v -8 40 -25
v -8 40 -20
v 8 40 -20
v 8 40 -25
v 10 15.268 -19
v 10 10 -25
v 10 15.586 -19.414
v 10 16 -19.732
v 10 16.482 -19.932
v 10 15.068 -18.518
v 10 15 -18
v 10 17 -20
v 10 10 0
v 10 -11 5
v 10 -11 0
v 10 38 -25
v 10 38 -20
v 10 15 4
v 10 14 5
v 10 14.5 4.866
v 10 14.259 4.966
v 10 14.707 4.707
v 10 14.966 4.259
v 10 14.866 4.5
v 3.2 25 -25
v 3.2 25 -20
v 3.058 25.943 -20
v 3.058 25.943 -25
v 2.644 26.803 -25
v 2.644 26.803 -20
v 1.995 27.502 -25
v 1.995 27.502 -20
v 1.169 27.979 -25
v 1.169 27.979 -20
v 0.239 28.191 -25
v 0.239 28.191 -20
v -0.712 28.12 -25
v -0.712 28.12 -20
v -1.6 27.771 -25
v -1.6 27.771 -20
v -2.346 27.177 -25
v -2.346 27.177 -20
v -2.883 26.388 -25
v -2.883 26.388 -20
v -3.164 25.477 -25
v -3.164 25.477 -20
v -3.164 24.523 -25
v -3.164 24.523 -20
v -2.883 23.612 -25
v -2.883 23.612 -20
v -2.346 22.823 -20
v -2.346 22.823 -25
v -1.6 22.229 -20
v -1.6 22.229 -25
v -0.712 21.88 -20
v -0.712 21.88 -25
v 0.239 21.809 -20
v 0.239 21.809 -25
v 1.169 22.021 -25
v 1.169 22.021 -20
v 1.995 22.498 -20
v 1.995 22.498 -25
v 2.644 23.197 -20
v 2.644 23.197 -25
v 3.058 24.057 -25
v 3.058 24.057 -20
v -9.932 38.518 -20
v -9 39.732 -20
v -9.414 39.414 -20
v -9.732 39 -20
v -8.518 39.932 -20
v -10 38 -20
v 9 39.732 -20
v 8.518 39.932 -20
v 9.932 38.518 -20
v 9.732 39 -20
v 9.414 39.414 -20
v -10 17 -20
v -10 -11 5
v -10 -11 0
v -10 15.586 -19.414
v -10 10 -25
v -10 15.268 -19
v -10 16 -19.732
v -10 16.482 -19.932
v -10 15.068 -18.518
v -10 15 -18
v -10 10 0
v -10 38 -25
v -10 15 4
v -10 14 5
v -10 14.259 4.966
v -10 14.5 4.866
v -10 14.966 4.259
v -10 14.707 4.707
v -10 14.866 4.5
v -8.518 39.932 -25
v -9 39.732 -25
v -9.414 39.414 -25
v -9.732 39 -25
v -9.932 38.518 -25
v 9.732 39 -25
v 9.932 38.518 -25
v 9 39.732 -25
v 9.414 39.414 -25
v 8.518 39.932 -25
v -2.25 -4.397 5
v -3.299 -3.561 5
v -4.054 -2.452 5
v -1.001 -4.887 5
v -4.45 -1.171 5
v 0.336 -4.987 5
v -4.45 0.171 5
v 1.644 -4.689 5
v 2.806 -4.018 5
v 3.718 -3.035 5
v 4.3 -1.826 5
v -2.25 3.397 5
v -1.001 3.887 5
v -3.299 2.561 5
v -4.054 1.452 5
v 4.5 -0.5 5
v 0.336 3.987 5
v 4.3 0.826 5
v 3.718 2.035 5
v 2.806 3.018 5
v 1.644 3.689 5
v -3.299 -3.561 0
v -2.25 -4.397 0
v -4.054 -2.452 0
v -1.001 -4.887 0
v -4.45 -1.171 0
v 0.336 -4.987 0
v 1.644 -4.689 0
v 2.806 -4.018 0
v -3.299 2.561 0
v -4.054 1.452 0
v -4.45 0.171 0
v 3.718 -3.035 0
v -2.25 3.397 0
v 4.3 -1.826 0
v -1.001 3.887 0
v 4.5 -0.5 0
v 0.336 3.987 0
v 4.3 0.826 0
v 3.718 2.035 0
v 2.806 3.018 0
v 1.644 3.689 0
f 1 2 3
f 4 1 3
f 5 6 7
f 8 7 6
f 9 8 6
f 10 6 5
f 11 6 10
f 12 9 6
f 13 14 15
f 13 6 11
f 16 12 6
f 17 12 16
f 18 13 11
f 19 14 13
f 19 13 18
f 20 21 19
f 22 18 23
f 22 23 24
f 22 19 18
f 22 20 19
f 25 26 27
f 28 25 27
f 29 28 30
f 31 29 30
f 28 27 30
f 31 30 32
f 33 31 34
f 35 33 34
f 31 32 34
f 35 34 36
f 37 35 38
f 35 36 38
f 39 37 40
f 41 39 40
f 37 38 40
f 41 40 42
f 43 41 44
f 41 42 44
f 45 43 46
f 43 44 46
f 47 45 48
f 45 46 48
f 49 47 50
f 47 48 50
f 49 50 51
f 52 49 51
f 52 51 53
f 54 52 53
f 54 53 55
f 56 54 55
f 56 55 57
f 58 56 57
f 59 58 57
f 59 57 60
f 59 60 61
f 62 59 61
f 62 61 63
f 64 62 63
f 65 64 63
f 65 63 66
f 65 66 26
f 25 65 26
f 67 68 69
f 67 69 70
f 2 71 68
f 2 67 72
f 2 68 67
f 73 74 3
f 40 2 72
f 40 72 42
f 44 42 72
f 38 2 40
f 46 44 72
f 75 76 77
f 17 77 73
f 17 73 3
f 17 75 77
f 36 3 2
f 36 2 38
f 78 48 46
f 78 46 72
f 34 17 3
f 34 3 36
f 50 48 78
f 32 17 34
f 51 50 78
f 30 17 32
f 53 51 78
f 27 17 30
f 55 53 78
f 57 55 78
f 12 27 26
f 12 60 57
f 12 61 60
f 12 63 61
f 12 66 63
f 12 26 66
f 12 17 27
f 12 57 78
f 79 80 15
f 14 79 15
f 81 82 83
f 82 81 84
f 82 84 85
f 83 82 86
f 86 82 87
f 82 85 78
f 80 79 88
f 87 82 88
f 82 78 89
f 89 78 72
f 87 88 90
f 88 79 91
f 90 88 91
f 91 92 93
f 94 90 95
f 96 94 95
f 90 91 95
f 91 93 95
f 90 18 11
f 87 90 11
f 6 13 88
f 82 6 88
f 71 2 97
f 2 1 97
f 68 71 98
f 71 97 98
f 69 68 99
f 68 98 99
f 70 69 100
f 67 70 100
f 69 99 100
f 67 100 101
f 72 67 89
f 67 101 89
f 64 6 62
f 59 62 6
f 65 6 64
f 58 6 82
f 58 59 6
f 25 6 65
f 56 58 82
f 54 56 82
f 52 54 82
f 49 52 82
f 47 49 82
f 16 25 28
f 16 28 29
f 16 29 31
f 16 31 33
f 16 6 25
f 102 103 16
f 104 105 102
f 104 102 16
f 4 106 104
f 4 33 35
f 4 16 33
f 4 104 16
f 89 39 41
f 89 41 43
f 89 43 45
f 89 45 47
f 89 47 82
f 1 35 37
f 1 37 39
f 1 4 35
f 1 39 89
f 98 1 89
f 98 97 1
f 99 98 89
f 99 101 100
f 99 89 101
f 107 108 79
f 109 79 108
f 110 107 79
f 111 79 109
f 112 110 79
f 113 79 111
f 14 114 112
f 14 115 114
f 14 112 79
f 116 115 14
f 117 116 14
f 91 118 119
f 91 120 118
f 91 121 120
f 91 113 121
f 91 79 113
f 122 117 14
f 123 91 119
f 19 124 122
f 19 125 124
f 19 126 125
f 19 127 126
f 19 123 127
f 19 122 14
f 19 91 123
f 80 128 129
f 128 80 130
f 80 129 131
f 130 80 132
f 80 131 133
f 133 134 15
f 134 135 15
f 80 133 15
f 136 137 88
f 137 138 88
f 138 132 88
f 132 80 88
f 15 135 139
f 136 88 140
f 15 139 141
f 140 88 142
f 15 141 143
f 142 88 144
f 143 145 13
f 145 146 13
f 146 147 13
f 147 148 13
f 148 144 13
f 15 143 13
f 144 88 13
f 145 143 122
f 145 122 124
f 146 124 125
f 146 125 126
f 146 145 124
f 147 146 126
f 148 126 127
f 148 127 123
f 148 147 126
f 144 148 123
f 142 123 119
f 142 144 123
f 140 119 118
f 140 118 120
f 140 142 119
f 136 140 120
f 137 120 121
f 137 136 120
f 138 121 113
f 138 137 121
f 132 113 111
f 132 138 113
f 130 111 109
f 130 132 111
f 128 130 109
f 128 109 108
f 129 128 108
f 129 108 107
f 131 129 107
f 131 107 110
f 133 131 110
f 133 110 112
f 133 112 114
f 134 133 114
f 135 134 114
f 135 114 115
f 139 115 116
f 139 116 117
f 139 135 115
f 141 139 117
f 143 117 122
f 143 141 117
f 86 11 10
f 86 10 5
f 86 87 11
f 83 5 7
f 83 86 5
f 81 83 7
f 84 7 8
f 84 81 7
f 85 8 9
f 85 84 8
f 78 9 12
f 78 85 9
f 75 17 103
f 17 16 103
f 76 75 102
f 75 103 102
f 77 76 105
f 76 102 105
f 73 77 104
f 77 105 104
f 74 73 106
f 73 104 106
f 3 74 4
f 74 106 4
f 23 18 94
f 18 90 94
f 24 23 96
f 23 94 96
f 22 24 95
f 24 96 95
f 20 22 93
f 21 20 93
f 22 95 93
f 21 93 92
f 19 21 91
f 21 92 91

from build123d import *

# Parameters (mm, degrees)
SKETCH1_R           = 4.5
BOSS_EXTRUDE1_DEPTH = 5
SKETCH2_W           = 20
SKETCH2_H           = 39
BOSS_EXTRUDE2_DEPTH = 25
CUT_EXTRUDE1_DEPTH  = 30
SKETCH4_R           = 3.2
CUT_EXTRUDE2_DEPTH  = 10
FILLET1_R           = 2
FILLET2_R           = 1
SKETCH5_W           = 20
SKETCH5_H           = 9
CUT_EXTRUDE3_DEPTH  = 10
FILLET3_R           = 2


with BuildPart() as part:
    # Sketch1 → Boss-Extrude1 (new body)
    with BuildSketch(Plane.XY):
        Polygon((-10, 10), (-10, -10), (-10, -11), (10, -11), (10, -10), (10, 10), (10, 44), (-10, 44), align=None)
        with Locations((0, -0.5)):
            Circle(SKETCH1_R, mode=Mode.SUBTRACT)
    extrude(amount=BOSS_EXTRUDE1_DEPTH)

    # Sketch2 → Boss-Extrude2 (add)
    with BuildSketch(Plane(origin=(0, 0, 0), x_dir=(-1, 0, 0), z_dir=(0, 0, -1))):
        with Locations((0, 29.5)):
            Rectangle(SKETCH2_W, SKETCH2_H)
    extrude(amount=BOSS_EXTRUDE2_DEPTH)

    # Sketch3 → Cut-Extrude1 (cut)
    with BuildSketch(Plane(origin=(10, 0, 0), x_dir=(0, 0, -1), z_dir=(1, 0, 0))):
        Polygon((0, 15), (-5, 15), (-5, 49), (20, 49), (20, 15), align=None)
    extrude(amount=-CUT_EXTRUDE1_DEPTH, mode=Mode.SUBTRACT)

    # Sketch4 → Cut-Extrude2 (cut)
    with BuildSketch(Plane.XY.offset(-20)):
        with Locations((0, 25)):
            Circle(SKETCH4_R)
    extrude(amount=-CUT_EXTRUDE2_DEPTH, mode=Mode.SUBTRACT)

    # Fillet1
    fillet1_edges = [part.edges().sort_by_distance(p)[0] for p in [
        (0, 15, -20),
    ]]
    fillet(fillet1_edges, radius=FILLET1_R)

    # Fillet2
    fillet2_edges = [part.edges().sort_by_distance(p)[0] for p in [
        (0, 15, 5),
    ]]
    fillet(fillet2_edges, radius=FILLET2_R)

    # Sketch5 → Cut-Extrude3 (cut)
    with BuildSketch(Plane.XY.offset(-20)):
        with Locations((0, 44.5)):
            Rectangle(SKETCH5_W, SKETCH5_H)
    extrude(amount=-CUT_EXTRUDE3_DEPTH, mode=Mode.SUBTRACT)

    # Fillet3
    fillet3_edges = [part.edges().sort_by_distance(p)[0] for p in [
        (10, 40, -22.5),
        (-10, 40, -22.5),
    ]]
    fillet(fillet3_edges, radius=FILLET3_R)


solid = part.part
